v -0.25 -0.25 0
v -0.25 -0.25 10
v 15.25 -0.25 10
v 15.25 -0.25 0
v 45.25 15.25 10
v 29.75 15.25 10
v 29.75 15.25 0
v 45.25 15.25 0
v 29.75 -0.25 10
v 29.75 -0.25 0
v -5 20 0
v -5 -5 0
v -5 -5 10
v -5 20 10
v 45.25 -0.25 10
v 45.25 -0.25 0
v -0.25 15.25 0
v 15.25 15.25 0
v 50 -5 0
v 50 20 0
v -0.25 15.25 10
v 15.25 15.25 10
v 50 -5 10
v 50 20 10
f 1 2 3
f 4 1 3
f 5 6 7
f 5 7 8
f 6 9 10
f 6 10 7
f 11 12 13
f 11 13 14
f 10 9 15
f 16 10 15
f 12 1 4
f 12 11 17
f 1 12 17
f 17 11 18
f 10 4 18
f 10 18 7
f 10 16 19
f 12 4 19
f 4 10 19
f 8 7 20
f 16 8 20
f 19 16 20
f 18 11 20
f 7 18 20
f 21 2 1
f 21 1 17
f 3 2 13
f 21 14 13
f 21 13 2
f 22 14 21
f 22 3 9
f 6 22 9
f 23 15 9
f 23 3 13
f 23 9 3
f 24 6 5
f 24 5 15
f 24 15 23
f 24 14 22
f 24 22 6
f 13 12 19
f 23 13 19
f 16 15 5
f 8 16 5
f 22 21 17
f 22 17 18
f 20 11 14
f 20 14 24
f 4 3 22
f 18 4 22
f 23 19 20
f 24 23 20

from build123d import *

# Parameters (mm, degrees)
SKETCH_W     = 55
SKETCH_H     = 25
SKETCH_W_2   = 15
SKETCH_H_2   = 15
PAD_DEPTH    = 10
SKETCH001_W  = 15.5
SKETCH001_H  = 15.5
POCKET_DEPTH = 10.001


with BuildPart() as part:
    # Sketch → Pad (new body)
    with BuildSketch(Plane.XY):
        with Locations((22.5, 7.5)):
            Rectangle(SKETCH_W, SKETCH_H)
        with Locations((7.5, 7.5)):
            Rectangle(SKETCH_W_2, SKETCH_H_2, mode=Mode.SUBTRACT)
        with Locations((37.5, 7.5)):
            Rectangle(SKETCH_W_2, SKETCH_H_2, mode=Mode.SUBTRACT)
    extrude(amount=PAD_DEPTH)

    # Sketch001 (on Face14 of Pad) → Pocket (cut, through all)
    with BuildSketch(Plane.XY.offset(10)):
        with Locations((7.5, 7.5)):
            Rectangle(SKETCH001_W, SKETCH001_H)
        with Locations((37.5, 7.5)):
            Rectangle(SKETCH001_W, SKETCH001_H)
    extrude(amount=-POCKET_DEPTH, mode=Mode.SUBTRACT)


solid = part.part
